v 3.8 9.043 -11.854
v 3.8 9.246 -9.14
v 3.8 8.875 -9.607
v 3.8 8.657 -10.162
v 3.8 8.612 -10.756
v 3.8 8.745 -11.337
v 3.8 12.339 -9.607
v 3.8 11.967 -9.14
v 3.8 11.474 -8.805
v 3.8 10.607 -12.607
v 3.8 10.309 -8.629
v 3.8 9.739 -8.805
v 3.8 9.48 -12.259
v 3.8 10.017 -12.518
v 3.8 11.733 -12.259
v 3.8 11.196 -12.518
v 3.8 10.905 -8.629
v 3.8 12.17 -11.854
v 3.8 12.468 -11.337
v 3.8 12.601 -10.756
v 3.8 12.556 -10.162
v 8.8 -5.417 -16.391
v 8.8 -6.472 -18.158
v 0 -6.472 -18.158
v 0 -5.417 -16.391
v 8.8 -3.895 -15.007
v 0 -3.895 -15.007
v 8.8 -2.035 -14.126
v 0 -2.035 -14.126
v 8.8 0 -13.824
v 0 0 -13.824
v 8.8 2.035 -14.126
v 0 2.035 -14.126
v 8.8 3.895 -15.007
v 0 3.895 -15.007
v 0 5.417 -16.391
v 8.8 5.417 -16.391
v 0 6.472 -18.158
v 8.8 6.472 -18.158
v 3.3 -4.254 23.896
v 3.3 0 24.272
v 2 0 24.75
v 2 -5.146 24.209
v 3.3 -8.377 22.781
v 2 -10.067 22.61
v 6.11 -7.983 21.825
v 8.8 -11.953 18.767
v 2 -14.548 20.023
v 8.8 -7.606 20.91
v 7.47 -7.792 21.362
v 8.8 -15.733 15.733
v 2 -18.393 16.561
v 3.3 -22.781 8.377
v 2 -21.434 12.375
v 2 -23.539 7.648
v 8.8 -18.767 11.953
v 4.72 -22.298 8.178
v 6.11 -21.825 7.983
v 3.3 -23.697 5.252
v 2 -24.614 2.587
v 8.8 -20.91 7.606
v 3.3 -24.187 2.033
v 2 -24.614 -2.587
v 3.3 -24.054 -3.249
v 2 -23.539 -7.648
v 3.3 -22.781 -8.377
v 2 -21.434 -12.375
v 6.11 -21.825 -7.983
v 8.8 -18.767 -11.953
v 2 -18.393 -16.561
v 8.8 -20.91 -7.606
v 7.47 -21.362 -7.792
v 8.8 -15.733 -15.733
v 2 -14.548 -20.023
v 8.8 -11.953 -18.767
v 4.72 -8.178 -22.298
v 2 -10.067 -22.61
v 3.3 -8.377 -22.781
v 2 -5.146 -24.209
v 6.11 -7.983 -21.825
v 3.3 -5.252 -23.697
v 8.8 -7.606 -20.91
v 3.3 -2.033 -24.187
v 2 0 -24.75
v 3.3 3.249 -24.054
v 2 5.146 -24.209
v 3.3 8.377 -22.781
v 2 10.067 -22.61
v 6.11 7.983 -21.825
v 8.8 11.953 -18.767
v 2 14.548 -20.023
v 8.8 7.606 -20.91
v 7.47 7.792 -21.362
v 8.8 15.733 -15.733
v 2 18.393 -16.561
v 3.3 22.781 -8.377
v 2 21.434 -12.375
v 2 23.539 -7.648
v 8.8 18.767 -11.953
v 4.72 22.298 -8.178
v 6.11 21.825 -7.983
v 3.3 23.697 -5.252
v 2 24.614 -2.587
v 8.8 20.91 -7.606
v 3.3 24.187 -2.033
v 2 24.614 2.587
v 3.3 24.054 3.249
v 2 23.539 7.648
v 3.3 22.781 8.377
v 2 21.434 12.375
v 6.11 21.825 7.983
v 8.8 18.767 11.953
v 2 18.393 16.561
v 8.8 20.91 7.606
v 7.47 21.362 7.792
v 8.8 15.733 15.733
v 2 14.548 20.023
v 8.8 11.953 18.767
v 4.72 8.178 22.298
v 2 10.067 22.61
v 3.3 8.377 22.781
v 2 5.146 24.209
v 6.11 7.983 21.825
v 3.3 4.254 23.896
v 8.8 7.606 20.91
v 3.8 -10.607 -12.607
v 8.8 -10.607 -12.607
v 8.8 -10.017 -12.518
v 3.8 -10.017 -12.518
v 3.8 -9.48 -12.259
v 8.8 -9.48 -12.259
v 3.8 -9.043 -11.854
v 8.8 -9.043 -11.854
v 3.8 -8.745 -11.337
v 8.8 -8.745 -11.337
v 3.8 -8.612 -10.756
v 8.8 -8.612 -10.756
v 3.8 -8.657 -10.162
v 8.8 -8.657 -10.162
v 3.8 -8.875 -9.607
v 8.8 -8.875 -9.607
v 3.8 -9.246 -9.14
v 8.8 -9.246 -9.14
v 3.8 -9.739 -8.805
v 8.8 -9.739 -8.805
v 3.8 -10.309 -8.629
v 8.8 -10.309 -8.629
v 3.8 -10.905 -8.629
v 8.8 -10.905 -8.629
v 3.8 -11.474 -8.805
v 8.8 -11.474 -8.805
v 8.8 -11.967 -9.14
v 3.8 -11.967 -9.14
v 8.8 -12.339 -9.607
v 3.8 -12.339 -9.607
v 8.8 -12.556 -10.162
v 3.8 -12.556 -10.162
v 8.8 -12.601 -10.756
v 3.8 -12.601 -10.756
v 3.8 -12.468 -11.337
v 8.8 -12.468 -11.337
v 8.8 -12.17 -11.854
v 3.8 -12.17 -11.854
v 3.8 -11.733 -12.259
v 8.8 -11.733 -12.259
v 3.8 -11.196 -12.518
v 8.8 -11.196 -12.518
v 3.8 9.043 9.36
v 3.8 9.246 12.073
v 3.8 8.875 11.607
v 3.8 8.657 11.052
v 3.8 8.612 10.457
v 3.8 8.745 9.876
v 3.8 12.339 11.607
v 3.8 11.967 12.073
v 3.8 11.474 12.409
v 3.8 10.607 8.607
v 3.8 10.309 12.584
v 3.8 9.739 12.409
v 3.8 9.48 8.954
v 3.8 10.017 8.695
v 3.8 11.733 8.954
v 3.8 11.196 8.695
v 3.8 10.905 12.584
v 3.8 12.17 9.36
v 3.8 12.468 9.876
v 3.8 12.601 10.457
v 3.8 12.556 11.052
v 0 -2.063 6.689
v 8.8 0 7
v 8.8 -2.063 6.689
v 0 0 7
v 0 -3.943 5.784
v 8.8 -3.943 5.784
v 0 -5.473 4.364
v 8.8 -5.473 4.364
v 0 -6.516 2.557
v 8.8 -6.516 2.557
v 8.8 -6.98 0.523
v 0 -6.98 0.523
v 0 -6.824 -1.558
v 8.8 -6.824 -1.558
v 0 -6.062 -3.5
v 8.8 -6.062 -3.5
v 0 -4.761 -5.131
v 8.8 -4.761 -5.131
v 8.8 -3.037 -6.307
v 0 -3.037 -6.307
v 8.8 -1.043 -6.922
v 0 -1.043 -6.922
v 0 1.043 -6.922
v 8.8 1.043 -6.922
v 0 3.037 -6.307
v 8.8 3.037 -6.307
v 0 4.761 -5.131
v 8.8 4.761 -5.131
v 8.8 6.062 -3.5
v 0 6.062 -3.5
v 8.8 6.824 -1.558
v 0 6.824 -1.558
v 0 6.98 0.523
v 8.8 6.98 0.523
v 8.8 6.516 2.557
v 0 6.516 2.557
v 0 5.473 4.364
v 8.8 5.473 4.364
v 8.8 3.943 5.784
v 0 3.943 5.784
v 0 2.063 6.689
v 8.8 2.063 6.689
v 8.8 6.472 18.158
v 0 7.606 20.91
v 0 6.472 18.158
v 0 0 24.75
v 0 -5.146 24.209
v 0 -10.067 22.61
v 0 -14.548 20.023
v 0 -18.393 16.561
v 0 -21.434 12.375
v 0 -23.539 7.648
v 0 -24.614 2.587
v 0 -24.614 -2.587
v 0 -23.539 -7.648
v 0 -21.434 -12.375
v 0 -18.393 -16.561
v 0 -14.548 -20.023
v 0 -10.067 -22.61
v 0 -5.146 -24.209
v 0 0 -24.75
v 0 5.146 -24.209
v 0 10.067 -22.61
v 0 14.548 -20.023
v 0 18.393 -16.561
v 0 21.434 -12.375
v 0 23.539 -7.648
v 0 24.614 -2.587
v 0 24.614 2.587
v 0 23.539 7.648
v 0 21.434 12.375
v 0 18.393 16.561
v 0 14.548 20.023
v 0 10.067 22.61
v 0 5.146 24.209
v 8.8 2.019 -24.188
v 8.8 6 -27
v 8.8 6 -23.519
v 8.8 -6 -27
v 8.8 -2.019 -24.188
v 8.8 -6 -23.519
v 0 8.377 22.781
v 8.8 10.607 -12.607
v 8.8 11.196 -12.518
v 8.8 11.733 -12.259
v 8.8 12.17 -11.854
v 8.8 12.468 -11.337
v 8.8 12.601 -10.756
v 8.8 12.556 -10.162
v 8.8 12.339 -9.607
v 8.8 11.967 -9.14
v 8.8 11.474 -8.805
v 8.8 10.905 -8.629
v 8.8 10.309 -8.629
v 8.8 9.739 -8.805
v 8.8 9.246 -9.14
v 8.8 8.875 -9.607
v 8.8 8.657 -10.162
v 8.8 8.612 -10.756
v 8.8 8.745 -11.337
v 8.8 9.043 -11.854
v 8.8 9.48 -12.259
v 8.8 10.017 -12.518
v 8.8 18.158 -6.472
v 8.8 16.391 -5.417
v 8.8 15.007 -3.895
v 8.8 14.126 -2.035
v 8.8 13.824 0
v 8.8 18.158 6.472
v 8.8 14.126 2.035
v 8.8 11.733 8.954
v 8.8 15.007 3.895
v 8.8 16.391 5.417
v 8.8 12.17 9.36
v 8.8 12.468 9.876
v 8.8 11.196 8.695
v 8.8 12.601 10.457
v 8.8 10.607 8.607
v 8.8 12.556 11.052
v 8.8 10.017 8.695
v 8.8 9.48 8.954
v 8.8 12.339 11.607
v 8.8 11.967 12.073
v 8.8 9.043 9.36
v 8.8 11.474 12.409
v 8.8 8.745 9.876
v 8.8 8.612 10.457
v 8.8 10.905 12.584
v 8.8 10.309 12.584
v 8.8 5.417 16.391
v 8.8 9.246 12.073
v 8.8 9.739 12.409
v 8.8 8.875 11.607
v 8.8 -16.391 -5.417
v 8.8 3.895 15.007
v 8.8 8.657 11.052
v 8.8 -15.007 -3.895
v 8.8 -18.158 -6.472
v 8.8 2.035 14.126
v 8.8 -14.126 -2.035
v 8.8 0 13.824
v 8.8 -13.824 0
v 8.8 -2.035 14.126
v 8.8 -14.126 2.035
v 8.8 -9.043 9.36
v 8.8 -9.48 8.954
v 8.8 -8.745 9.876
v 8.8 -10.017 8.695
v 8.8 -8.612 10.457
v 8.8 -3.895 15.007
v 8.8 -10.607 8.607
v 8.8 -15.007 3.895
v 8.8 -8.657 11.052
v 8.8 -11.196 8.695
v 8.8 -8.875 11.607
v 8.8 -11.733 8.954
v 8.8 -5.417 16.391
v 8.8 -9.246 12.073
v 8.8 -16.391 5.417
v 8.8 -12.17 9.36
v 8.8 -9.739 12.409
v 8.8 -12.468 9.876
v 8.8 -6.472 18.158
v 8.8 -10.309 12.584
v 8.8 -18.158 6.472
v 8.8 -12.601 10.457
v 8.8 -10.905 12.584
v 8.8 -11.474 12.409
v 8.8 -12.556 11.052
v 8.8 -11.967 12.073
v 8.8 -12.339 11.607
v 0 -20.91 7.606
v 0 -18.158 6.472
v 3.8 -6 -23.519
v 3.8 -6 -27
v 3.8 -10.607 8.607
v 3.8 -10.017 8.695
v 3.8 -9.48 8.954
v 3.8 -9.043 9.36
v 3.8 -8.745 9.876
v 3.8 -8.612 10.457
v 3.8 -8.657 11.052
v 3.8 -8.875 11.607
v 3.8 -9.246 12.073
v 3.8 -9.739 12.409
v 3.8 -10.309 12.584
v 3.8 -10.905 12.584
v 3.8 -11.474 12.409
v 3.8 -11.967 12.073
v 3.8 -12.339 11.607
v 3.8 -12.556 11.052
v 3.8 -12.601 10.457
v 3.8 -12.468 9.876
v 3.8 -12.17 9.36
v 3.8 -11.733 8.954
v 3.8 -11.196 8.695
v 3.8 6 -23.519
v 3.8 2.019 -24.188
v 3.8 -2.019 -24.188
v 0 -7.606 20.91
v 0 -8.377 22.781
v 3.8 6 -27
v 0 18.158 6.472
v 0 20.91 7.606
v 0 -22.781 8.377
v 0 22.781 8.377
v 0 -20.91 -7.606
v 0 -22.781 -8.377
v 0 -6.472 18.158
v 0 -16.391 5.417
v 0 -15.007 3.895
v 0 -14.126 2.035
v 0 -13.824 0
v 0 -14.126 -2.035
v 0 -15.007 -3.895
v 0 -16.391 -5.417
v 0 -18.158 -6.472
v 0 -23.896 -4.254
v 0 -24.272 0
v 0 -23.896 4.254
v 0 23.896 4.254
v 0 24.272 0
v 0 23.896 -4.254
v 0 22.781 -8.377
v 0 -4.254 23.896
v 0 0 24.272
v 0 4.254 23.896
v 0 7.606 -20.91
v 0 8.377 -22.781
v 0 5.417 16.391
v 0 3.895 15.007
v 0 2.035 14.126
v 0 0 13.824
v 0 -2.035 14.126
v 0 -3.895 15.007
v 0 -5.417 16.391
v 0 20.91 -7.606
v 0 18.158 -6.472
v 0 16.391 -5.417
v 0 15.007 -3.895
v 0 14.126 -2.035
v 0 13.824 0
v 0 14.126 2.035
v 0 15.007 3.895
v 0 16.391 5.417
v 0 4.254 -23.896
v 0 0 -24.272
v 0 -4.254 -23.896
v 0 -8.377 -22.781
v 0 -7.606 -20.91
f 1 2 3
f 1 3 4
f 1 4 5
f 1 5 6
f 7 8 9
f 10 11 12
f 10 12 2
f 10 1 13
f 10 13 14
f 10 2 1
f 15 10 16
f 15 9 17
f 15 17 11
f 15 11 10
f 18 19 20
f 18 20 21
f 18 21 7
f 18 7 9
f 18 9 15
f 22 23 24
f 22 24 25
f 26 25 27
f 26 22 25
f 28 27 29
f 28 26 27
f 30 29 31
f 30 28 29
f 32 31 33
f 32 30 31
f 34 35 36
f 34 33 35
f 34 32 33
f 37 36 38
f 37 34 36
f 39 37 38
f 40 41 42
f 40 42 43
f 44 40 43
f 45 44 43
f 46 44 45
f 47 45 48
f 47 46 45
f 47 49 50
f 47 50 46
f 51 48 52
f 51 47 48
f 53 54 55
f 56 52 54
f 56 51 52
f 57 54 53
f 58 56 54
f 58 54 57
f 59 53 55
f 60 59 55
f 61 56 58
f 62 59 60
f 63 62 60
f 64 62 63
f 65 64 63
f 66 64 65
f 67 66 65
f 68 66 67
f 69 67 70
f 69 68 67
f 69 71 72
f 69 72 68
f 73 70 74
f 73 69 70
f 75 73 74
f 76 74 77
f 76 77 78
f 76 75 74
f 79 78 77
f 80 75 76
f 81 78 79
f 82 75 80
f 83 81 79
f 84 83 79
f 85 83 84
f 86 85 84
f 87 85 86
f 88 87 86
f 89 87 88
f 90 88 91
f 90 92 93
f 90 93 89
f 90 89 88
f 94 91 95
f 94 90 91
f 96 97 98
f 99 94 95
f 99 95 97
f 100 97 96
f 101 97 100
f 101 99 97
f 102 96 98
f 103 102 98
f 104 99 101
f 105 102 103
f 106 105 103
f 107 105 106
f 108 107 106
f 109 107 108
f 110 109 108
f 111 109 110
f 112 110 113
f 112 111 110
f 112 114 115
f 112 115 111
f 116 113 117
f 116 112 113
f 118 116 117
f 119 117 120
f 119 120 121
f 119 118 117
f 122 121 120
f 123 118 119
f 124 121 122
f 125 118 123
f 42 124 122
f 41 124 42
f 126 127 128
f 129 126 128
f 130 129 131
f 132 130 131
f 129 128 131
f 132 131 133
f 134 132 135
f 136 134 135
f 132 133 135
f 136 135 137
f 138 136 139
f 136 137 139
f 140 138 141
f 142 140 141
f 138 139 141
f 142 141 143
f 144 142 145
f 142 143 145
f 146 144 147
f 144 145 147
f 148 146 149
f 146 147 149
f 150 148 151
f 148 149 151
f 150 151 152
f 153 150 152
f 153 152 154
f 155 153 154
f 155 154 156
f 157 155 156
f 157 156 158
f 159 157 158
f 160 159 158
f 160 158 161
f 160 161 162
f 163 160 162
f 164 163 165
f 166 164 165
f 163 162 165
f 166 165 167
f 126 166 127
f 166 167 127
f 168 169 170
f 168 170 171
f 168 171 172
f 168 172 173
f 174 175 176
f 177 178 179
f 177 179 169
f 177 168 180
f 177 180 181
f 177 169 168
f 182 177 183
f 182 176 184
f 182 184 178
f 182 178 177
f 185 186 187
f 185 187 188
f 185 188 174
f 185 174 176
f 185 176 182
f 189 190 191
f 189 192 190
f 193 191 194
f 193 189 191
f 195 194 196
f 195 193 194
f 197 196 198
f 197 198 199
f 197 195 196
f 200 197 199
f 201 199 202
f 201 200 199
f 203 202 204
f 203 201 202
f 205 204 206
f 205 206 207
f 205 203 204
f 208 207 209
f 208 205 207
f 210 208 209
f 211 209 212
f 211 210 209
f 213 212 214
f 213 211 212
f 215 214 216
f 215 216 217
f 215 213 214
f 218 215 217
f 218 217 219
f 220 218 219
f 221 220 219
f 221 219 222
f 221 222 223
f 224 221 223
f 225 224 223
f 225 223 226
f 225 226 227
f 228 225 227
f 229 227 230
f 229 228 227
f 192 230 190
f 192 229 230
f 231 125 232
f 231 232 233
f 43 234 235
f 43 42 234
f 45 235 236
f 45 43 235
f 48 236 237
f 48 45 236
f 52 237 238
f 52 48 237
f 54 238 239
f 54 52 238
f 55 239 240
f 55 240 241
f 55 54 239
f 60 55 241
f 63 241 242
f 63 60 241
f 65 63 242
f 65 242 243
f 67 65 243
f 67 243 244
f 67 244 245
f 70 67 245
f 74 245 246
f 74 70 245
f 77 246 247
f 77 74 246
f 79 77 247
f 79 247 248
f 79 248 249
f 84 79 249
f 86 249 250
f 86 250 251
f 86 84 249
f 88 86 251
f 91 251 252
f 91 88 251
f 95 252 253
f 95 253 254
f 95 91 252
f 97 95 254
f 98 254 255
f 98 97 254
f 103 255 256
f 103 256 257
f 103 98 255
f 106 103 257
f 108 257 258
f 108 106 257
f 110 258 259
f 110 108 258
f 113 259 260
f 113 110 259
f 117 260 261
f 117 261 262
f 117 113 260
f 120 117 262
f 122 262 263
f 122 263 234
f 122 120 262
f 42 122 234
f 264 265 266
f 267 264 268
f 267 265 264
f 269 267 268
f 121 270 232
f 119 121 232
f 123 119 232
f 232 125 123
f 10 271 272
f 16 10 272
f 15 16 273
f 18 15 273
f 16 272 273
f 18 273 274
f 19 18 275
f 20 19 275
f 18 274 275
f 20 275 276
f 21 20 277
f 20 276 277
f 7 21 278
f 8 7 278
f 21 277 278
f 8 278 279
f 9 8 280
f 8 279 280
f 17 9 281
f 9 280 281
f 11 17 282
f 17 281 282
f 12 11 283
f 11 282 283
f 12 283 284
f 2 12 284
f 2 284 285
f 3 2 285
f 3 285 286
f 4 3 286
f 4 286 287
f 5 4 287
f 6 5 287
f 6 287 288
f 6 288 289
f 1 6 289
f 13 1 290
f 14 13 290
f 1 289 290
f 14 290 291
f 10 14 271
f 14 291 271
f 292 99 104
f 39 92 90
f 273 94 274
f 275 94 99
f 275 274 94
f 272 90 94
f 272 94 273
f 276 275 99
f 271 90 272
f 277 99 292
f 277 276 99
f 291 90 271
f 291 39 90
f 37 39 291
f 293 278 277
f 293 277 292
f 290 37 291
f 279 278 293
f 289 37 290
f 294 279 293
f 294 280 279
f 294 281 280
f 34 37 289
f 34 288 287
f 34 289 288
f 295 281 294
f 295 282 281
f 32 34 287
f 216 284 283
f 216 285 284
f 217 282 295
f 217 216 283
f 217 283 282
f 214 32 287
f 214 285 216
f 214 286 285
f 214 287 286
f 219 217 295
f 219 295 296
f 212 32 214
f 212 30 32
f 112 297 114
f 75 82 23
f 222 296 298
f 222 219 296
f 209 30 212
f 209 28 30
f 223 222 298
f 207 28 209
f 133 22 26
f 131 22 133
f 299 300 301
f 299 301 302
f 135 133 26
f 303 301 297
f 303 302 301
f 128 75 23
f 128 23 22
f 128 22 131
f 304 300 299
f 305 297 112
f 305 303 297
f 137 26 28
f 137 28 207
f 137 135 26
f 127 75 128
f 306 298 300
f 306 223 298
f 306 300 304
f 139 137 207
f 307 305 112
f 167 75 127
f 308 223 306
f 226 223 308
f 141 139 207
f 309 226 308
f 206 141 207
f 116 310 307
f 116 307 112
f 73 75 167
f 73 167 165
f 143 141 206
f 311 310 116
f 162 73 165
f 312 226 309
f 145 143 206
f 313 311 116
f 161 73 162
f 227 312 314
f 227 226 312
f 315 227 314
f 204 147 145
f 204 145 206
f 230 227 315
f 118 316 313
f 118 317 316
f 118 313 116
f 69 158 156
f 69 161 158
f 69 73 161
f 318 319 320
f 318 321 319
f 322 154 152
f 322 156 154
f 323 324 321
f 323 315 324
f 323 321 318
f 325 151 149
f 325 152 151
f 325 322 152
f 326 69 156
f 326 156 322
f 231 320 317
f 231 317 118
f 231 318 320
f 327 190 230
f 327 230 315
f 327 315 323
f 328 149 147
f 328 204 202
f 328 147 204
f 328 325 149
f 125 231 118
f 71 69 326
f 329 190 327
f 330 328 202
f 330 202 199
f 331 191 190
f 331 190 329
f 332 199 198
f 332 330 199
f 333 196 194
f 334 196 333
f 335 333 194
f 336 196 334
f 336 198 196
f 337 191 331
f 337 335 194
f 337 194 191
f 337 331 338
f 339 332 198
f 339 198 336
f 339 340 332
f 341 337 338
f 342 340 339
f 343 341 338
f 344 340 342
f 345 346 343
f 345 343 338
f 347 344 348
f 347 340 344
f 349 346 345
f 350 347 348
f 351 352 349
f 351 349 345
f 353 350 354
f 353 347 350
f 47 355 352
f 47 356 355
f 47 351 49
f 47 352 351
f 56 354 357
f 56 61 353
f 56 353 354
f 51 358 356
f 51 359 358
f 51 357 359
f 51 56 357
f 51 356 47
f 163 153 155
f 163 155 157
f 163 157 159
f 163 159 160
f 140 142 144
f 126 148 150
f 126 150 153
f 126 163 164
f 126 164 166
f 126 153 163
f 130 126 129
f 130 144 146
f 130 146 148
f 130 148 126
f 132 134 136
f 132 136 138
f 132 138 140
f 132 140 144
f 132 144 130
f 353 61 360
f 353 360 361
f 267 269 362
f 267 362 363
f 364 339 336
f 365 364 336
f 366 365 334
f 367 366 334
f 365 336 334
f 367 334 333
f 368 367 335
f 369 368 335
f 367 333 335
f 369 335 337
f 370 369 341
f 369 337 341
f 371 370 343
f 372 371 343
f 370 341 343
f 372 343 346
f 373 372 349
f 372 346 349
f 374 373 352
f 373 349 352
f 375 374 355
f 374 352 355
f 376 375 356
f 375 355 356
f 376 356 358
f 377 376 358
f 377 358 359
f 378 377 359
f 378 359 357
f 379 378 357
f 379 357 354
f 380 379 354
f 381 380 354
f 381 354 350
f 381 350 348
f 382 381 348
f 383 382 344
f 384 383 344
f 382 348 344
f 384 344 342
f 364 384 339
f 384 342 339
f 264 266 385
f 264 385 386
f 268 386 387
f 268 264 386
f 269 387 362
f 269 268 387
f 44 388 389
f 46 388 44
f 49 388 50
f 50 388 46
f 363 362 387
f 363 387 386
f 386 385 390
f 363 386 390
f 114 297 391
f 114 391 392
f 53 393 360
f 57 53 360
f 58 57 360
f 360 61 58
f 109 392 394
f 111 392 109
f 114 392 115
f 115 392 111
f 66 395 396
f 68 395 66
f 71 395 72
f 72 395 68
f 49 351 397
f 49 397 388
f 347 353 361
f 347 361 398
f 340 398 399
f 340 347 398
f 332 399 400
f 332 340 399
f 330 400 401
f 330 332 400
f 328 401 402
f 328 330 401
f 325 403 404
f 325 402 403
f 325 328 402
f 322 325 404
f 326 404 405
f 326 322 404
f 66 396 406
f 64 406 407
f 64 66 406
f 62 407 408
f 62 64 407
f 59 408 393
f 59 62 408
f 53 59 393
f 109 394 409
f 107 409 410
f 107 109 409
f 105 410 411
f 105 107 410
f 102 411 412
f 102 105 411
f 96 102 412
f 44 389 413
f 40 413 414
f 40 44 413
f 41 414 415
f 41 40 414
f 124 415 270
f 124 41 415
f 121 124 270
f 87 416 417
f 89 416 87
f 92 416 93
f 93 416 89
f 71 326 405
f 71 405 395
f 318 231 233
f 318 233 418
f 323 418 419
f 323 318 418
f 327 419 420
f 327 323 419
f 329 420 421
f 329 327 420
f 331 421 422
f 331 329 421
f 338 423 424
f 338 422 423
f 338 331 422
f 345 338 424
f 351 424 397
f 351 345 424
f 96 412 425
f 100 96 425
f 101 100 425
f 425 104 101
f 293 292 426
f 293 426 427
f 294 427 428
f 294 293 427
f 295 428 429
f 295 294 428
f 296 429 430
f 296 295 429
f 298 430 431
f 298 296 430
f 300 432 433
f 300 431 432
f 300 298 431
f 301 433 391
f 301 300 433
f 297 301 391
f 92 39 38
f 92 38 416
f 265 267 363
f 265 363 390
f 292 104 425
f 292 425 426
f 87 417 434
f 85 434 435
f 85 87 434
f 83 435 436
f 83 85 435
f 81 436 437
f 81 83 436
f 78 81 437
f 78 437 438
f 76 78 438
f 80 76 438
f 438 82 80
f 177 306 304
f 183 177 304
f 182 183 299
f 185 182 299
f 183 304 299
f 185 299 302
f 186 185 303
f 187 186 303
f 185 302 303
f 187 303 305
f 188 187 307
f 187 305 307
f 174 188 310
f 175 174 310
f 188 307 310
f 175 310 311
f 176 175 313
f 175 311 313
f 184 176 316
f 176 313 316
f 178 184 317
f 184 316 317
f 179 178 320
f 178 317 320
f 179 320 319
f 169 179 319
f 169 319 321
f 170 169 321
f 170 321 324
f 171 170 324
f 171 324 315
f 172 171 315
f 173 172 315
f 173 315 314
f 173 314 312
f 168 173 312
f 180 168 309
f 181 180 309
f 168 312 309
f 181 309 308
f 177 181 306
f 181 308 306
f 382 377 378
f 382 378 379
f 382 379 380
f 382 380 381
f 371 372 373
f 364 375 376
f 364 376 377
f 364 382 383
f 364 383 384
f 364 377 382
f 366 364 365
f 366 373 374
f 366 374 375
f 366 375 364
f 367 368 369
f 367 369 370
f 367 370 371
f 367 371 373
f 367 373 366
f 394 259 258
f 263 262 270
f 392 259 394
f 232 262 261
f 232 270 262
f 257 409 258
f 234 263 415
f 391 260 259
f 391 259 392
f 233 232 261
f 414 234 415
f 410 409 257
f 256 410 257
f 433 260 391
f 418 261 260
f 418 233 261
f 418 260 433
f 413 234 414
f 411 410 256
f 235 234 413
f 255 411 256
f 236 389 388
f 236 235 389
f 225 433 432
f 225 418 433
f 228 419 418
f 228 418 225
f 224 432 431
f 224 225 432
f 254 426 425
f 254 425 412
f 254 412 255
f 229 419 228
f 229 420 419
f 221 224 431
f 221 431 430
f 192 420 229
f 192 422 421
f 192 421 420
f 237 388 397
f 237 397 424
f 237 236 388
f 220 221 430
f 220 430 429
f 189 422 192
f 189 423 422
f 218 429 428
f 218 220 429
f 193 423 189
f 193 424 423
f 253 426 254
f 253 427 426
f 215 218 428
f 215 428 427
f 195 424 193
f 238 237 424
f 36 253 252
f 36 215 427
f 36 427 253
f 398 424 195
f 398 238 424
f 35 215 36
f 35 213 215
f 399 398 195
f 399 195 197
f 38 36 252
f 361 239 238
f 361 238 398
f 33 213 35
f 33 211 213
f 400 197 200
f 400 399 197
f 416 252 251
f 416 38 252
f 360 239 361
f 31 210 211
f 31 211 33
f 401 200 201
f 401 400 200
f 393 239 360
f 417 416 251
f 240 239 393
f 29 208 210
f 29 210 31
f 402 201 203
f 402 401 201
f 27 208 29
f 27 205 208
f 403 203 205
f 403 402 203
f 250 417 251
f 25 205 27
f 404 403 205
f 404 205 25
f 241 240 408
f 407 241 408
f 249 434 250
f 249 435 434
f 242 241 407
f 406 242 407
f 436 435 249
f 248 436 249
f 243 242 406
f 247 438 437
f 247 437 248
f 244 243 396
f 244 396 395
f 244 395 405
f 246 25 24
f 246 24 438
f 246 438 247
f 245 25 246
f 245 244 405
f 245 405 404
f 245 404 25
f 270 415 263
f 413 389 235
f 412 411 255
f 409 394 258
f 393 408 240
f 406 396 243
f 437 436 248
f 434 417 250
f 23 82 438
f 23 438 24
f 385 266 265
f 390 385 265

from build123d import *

# Parameters (mm, degrees)
SKETCH3_R           = 2
CUT_EXTRUDE1_DEPTH  = 5
SKETCH4_W           = 12
SKETCH4_H           = 12
BOSS_EXTRUDE1_DEPTH = 5
CUT_EXTRUDE2_DEPTH  = 38.669649587
CIRPATTERN1_COUNT   = 4


with BuildPart() as part:
    # Sketch2 → Revolve1 (revolve)
    with BuildSketch(Plane.XY, mode=Mode.PRIVATE) as revolve1_sk:
        Polygon((0, 24.75), (2, 24.75), (8.8, 22.25), (8.8, 7), (0, 7), align=None)
    revolve(revolve1_sk.sketch.rotate(Axis((0, 0, 0), (1, 0, 0)), 90), axis=Axis((0, 0, 0), (1, 0, 0)))

    # Sketch3 → Cut-Extrude1 (cut)
    with BuildSketch(Plane(origin=(8.8, 0, 0), x_dir=(0, 0, -1), z_dir=(1, 0, 0))):
        with Locations((10.606601718, 10.606601718)):
            Circle(SKETCH3_R)
        with Locations((10.606601718, -10.606601718)):
            Circle(SKETCH3_R)
        with Locations((-10.606601718, -10.606601718)):
            Circle(SKETCH3_R)
        with Locations((-10.606601718, 10.606601718)):
            Circle(SKETCH3_R)
    extrude(amount=-CUT_EXTRUDE1_DEPTH, mode=Mode.SUBTRACT)

    # Sketch4 → Boss-Extrude1 (add)
    with BuildSketch(Plane(origin=(8.8, 0, 0), x_dir=(0, 0, -1), z_dir=(1, 0, 0))):
        with Locations((21, 0)):
            Rectangle(SKETCH4_W, SKETCH4_H)
    extrude(amount=-BOSS_EXTRUDE1_DEPTH)

    # Sketch6 → Cut-Extrude2 (cut, through all)
    with BuildSketch(Plane(origin=(8.8, 0, 0), x_dir=(0, 0, -1), z_dir=(1, 0, 0))):
        with BuildLine():
            Line((-6.472300805, 18.157581623), (-7.606019278, 20.909590401))
            Line((-7.606019278, 20.909590401), (-8.376823121, 22.780653627))
            ThreePointArc((-8.376823121, 22.780653627), (0, 24.271986842), (8.376823121, 22.780653627))
            Line((8.376823121, 22.780653627), (7.606019278, 20.909590401))
            Line((7.606019278, 20.909590401), (6.472300805, 18.157581623))
            ThreePointArc((6.472300805, 18.157581623), (0, 13.823912866), (-6.472300805, 18.157581623))
        make_face()
    cut_extrude2 = extrude(amount=-CUT_EXTRUDE2_DEPTH, mode=Mode.SUBTRACT)

    # CirPattern1: Cut-Extrude2 ×4 about axis
    cirpattern1_axis = Axis((0, 0, 0), (1, 0, 0))
    for i in range(1, CIRPATTERN1_COUNT):
        add(cut_extrude2.rotate(cirpattern1_axis, i * 360 / CIRPATTERN1_COUNT), mode=Mode.SUBTRACT)


solid = part.part
